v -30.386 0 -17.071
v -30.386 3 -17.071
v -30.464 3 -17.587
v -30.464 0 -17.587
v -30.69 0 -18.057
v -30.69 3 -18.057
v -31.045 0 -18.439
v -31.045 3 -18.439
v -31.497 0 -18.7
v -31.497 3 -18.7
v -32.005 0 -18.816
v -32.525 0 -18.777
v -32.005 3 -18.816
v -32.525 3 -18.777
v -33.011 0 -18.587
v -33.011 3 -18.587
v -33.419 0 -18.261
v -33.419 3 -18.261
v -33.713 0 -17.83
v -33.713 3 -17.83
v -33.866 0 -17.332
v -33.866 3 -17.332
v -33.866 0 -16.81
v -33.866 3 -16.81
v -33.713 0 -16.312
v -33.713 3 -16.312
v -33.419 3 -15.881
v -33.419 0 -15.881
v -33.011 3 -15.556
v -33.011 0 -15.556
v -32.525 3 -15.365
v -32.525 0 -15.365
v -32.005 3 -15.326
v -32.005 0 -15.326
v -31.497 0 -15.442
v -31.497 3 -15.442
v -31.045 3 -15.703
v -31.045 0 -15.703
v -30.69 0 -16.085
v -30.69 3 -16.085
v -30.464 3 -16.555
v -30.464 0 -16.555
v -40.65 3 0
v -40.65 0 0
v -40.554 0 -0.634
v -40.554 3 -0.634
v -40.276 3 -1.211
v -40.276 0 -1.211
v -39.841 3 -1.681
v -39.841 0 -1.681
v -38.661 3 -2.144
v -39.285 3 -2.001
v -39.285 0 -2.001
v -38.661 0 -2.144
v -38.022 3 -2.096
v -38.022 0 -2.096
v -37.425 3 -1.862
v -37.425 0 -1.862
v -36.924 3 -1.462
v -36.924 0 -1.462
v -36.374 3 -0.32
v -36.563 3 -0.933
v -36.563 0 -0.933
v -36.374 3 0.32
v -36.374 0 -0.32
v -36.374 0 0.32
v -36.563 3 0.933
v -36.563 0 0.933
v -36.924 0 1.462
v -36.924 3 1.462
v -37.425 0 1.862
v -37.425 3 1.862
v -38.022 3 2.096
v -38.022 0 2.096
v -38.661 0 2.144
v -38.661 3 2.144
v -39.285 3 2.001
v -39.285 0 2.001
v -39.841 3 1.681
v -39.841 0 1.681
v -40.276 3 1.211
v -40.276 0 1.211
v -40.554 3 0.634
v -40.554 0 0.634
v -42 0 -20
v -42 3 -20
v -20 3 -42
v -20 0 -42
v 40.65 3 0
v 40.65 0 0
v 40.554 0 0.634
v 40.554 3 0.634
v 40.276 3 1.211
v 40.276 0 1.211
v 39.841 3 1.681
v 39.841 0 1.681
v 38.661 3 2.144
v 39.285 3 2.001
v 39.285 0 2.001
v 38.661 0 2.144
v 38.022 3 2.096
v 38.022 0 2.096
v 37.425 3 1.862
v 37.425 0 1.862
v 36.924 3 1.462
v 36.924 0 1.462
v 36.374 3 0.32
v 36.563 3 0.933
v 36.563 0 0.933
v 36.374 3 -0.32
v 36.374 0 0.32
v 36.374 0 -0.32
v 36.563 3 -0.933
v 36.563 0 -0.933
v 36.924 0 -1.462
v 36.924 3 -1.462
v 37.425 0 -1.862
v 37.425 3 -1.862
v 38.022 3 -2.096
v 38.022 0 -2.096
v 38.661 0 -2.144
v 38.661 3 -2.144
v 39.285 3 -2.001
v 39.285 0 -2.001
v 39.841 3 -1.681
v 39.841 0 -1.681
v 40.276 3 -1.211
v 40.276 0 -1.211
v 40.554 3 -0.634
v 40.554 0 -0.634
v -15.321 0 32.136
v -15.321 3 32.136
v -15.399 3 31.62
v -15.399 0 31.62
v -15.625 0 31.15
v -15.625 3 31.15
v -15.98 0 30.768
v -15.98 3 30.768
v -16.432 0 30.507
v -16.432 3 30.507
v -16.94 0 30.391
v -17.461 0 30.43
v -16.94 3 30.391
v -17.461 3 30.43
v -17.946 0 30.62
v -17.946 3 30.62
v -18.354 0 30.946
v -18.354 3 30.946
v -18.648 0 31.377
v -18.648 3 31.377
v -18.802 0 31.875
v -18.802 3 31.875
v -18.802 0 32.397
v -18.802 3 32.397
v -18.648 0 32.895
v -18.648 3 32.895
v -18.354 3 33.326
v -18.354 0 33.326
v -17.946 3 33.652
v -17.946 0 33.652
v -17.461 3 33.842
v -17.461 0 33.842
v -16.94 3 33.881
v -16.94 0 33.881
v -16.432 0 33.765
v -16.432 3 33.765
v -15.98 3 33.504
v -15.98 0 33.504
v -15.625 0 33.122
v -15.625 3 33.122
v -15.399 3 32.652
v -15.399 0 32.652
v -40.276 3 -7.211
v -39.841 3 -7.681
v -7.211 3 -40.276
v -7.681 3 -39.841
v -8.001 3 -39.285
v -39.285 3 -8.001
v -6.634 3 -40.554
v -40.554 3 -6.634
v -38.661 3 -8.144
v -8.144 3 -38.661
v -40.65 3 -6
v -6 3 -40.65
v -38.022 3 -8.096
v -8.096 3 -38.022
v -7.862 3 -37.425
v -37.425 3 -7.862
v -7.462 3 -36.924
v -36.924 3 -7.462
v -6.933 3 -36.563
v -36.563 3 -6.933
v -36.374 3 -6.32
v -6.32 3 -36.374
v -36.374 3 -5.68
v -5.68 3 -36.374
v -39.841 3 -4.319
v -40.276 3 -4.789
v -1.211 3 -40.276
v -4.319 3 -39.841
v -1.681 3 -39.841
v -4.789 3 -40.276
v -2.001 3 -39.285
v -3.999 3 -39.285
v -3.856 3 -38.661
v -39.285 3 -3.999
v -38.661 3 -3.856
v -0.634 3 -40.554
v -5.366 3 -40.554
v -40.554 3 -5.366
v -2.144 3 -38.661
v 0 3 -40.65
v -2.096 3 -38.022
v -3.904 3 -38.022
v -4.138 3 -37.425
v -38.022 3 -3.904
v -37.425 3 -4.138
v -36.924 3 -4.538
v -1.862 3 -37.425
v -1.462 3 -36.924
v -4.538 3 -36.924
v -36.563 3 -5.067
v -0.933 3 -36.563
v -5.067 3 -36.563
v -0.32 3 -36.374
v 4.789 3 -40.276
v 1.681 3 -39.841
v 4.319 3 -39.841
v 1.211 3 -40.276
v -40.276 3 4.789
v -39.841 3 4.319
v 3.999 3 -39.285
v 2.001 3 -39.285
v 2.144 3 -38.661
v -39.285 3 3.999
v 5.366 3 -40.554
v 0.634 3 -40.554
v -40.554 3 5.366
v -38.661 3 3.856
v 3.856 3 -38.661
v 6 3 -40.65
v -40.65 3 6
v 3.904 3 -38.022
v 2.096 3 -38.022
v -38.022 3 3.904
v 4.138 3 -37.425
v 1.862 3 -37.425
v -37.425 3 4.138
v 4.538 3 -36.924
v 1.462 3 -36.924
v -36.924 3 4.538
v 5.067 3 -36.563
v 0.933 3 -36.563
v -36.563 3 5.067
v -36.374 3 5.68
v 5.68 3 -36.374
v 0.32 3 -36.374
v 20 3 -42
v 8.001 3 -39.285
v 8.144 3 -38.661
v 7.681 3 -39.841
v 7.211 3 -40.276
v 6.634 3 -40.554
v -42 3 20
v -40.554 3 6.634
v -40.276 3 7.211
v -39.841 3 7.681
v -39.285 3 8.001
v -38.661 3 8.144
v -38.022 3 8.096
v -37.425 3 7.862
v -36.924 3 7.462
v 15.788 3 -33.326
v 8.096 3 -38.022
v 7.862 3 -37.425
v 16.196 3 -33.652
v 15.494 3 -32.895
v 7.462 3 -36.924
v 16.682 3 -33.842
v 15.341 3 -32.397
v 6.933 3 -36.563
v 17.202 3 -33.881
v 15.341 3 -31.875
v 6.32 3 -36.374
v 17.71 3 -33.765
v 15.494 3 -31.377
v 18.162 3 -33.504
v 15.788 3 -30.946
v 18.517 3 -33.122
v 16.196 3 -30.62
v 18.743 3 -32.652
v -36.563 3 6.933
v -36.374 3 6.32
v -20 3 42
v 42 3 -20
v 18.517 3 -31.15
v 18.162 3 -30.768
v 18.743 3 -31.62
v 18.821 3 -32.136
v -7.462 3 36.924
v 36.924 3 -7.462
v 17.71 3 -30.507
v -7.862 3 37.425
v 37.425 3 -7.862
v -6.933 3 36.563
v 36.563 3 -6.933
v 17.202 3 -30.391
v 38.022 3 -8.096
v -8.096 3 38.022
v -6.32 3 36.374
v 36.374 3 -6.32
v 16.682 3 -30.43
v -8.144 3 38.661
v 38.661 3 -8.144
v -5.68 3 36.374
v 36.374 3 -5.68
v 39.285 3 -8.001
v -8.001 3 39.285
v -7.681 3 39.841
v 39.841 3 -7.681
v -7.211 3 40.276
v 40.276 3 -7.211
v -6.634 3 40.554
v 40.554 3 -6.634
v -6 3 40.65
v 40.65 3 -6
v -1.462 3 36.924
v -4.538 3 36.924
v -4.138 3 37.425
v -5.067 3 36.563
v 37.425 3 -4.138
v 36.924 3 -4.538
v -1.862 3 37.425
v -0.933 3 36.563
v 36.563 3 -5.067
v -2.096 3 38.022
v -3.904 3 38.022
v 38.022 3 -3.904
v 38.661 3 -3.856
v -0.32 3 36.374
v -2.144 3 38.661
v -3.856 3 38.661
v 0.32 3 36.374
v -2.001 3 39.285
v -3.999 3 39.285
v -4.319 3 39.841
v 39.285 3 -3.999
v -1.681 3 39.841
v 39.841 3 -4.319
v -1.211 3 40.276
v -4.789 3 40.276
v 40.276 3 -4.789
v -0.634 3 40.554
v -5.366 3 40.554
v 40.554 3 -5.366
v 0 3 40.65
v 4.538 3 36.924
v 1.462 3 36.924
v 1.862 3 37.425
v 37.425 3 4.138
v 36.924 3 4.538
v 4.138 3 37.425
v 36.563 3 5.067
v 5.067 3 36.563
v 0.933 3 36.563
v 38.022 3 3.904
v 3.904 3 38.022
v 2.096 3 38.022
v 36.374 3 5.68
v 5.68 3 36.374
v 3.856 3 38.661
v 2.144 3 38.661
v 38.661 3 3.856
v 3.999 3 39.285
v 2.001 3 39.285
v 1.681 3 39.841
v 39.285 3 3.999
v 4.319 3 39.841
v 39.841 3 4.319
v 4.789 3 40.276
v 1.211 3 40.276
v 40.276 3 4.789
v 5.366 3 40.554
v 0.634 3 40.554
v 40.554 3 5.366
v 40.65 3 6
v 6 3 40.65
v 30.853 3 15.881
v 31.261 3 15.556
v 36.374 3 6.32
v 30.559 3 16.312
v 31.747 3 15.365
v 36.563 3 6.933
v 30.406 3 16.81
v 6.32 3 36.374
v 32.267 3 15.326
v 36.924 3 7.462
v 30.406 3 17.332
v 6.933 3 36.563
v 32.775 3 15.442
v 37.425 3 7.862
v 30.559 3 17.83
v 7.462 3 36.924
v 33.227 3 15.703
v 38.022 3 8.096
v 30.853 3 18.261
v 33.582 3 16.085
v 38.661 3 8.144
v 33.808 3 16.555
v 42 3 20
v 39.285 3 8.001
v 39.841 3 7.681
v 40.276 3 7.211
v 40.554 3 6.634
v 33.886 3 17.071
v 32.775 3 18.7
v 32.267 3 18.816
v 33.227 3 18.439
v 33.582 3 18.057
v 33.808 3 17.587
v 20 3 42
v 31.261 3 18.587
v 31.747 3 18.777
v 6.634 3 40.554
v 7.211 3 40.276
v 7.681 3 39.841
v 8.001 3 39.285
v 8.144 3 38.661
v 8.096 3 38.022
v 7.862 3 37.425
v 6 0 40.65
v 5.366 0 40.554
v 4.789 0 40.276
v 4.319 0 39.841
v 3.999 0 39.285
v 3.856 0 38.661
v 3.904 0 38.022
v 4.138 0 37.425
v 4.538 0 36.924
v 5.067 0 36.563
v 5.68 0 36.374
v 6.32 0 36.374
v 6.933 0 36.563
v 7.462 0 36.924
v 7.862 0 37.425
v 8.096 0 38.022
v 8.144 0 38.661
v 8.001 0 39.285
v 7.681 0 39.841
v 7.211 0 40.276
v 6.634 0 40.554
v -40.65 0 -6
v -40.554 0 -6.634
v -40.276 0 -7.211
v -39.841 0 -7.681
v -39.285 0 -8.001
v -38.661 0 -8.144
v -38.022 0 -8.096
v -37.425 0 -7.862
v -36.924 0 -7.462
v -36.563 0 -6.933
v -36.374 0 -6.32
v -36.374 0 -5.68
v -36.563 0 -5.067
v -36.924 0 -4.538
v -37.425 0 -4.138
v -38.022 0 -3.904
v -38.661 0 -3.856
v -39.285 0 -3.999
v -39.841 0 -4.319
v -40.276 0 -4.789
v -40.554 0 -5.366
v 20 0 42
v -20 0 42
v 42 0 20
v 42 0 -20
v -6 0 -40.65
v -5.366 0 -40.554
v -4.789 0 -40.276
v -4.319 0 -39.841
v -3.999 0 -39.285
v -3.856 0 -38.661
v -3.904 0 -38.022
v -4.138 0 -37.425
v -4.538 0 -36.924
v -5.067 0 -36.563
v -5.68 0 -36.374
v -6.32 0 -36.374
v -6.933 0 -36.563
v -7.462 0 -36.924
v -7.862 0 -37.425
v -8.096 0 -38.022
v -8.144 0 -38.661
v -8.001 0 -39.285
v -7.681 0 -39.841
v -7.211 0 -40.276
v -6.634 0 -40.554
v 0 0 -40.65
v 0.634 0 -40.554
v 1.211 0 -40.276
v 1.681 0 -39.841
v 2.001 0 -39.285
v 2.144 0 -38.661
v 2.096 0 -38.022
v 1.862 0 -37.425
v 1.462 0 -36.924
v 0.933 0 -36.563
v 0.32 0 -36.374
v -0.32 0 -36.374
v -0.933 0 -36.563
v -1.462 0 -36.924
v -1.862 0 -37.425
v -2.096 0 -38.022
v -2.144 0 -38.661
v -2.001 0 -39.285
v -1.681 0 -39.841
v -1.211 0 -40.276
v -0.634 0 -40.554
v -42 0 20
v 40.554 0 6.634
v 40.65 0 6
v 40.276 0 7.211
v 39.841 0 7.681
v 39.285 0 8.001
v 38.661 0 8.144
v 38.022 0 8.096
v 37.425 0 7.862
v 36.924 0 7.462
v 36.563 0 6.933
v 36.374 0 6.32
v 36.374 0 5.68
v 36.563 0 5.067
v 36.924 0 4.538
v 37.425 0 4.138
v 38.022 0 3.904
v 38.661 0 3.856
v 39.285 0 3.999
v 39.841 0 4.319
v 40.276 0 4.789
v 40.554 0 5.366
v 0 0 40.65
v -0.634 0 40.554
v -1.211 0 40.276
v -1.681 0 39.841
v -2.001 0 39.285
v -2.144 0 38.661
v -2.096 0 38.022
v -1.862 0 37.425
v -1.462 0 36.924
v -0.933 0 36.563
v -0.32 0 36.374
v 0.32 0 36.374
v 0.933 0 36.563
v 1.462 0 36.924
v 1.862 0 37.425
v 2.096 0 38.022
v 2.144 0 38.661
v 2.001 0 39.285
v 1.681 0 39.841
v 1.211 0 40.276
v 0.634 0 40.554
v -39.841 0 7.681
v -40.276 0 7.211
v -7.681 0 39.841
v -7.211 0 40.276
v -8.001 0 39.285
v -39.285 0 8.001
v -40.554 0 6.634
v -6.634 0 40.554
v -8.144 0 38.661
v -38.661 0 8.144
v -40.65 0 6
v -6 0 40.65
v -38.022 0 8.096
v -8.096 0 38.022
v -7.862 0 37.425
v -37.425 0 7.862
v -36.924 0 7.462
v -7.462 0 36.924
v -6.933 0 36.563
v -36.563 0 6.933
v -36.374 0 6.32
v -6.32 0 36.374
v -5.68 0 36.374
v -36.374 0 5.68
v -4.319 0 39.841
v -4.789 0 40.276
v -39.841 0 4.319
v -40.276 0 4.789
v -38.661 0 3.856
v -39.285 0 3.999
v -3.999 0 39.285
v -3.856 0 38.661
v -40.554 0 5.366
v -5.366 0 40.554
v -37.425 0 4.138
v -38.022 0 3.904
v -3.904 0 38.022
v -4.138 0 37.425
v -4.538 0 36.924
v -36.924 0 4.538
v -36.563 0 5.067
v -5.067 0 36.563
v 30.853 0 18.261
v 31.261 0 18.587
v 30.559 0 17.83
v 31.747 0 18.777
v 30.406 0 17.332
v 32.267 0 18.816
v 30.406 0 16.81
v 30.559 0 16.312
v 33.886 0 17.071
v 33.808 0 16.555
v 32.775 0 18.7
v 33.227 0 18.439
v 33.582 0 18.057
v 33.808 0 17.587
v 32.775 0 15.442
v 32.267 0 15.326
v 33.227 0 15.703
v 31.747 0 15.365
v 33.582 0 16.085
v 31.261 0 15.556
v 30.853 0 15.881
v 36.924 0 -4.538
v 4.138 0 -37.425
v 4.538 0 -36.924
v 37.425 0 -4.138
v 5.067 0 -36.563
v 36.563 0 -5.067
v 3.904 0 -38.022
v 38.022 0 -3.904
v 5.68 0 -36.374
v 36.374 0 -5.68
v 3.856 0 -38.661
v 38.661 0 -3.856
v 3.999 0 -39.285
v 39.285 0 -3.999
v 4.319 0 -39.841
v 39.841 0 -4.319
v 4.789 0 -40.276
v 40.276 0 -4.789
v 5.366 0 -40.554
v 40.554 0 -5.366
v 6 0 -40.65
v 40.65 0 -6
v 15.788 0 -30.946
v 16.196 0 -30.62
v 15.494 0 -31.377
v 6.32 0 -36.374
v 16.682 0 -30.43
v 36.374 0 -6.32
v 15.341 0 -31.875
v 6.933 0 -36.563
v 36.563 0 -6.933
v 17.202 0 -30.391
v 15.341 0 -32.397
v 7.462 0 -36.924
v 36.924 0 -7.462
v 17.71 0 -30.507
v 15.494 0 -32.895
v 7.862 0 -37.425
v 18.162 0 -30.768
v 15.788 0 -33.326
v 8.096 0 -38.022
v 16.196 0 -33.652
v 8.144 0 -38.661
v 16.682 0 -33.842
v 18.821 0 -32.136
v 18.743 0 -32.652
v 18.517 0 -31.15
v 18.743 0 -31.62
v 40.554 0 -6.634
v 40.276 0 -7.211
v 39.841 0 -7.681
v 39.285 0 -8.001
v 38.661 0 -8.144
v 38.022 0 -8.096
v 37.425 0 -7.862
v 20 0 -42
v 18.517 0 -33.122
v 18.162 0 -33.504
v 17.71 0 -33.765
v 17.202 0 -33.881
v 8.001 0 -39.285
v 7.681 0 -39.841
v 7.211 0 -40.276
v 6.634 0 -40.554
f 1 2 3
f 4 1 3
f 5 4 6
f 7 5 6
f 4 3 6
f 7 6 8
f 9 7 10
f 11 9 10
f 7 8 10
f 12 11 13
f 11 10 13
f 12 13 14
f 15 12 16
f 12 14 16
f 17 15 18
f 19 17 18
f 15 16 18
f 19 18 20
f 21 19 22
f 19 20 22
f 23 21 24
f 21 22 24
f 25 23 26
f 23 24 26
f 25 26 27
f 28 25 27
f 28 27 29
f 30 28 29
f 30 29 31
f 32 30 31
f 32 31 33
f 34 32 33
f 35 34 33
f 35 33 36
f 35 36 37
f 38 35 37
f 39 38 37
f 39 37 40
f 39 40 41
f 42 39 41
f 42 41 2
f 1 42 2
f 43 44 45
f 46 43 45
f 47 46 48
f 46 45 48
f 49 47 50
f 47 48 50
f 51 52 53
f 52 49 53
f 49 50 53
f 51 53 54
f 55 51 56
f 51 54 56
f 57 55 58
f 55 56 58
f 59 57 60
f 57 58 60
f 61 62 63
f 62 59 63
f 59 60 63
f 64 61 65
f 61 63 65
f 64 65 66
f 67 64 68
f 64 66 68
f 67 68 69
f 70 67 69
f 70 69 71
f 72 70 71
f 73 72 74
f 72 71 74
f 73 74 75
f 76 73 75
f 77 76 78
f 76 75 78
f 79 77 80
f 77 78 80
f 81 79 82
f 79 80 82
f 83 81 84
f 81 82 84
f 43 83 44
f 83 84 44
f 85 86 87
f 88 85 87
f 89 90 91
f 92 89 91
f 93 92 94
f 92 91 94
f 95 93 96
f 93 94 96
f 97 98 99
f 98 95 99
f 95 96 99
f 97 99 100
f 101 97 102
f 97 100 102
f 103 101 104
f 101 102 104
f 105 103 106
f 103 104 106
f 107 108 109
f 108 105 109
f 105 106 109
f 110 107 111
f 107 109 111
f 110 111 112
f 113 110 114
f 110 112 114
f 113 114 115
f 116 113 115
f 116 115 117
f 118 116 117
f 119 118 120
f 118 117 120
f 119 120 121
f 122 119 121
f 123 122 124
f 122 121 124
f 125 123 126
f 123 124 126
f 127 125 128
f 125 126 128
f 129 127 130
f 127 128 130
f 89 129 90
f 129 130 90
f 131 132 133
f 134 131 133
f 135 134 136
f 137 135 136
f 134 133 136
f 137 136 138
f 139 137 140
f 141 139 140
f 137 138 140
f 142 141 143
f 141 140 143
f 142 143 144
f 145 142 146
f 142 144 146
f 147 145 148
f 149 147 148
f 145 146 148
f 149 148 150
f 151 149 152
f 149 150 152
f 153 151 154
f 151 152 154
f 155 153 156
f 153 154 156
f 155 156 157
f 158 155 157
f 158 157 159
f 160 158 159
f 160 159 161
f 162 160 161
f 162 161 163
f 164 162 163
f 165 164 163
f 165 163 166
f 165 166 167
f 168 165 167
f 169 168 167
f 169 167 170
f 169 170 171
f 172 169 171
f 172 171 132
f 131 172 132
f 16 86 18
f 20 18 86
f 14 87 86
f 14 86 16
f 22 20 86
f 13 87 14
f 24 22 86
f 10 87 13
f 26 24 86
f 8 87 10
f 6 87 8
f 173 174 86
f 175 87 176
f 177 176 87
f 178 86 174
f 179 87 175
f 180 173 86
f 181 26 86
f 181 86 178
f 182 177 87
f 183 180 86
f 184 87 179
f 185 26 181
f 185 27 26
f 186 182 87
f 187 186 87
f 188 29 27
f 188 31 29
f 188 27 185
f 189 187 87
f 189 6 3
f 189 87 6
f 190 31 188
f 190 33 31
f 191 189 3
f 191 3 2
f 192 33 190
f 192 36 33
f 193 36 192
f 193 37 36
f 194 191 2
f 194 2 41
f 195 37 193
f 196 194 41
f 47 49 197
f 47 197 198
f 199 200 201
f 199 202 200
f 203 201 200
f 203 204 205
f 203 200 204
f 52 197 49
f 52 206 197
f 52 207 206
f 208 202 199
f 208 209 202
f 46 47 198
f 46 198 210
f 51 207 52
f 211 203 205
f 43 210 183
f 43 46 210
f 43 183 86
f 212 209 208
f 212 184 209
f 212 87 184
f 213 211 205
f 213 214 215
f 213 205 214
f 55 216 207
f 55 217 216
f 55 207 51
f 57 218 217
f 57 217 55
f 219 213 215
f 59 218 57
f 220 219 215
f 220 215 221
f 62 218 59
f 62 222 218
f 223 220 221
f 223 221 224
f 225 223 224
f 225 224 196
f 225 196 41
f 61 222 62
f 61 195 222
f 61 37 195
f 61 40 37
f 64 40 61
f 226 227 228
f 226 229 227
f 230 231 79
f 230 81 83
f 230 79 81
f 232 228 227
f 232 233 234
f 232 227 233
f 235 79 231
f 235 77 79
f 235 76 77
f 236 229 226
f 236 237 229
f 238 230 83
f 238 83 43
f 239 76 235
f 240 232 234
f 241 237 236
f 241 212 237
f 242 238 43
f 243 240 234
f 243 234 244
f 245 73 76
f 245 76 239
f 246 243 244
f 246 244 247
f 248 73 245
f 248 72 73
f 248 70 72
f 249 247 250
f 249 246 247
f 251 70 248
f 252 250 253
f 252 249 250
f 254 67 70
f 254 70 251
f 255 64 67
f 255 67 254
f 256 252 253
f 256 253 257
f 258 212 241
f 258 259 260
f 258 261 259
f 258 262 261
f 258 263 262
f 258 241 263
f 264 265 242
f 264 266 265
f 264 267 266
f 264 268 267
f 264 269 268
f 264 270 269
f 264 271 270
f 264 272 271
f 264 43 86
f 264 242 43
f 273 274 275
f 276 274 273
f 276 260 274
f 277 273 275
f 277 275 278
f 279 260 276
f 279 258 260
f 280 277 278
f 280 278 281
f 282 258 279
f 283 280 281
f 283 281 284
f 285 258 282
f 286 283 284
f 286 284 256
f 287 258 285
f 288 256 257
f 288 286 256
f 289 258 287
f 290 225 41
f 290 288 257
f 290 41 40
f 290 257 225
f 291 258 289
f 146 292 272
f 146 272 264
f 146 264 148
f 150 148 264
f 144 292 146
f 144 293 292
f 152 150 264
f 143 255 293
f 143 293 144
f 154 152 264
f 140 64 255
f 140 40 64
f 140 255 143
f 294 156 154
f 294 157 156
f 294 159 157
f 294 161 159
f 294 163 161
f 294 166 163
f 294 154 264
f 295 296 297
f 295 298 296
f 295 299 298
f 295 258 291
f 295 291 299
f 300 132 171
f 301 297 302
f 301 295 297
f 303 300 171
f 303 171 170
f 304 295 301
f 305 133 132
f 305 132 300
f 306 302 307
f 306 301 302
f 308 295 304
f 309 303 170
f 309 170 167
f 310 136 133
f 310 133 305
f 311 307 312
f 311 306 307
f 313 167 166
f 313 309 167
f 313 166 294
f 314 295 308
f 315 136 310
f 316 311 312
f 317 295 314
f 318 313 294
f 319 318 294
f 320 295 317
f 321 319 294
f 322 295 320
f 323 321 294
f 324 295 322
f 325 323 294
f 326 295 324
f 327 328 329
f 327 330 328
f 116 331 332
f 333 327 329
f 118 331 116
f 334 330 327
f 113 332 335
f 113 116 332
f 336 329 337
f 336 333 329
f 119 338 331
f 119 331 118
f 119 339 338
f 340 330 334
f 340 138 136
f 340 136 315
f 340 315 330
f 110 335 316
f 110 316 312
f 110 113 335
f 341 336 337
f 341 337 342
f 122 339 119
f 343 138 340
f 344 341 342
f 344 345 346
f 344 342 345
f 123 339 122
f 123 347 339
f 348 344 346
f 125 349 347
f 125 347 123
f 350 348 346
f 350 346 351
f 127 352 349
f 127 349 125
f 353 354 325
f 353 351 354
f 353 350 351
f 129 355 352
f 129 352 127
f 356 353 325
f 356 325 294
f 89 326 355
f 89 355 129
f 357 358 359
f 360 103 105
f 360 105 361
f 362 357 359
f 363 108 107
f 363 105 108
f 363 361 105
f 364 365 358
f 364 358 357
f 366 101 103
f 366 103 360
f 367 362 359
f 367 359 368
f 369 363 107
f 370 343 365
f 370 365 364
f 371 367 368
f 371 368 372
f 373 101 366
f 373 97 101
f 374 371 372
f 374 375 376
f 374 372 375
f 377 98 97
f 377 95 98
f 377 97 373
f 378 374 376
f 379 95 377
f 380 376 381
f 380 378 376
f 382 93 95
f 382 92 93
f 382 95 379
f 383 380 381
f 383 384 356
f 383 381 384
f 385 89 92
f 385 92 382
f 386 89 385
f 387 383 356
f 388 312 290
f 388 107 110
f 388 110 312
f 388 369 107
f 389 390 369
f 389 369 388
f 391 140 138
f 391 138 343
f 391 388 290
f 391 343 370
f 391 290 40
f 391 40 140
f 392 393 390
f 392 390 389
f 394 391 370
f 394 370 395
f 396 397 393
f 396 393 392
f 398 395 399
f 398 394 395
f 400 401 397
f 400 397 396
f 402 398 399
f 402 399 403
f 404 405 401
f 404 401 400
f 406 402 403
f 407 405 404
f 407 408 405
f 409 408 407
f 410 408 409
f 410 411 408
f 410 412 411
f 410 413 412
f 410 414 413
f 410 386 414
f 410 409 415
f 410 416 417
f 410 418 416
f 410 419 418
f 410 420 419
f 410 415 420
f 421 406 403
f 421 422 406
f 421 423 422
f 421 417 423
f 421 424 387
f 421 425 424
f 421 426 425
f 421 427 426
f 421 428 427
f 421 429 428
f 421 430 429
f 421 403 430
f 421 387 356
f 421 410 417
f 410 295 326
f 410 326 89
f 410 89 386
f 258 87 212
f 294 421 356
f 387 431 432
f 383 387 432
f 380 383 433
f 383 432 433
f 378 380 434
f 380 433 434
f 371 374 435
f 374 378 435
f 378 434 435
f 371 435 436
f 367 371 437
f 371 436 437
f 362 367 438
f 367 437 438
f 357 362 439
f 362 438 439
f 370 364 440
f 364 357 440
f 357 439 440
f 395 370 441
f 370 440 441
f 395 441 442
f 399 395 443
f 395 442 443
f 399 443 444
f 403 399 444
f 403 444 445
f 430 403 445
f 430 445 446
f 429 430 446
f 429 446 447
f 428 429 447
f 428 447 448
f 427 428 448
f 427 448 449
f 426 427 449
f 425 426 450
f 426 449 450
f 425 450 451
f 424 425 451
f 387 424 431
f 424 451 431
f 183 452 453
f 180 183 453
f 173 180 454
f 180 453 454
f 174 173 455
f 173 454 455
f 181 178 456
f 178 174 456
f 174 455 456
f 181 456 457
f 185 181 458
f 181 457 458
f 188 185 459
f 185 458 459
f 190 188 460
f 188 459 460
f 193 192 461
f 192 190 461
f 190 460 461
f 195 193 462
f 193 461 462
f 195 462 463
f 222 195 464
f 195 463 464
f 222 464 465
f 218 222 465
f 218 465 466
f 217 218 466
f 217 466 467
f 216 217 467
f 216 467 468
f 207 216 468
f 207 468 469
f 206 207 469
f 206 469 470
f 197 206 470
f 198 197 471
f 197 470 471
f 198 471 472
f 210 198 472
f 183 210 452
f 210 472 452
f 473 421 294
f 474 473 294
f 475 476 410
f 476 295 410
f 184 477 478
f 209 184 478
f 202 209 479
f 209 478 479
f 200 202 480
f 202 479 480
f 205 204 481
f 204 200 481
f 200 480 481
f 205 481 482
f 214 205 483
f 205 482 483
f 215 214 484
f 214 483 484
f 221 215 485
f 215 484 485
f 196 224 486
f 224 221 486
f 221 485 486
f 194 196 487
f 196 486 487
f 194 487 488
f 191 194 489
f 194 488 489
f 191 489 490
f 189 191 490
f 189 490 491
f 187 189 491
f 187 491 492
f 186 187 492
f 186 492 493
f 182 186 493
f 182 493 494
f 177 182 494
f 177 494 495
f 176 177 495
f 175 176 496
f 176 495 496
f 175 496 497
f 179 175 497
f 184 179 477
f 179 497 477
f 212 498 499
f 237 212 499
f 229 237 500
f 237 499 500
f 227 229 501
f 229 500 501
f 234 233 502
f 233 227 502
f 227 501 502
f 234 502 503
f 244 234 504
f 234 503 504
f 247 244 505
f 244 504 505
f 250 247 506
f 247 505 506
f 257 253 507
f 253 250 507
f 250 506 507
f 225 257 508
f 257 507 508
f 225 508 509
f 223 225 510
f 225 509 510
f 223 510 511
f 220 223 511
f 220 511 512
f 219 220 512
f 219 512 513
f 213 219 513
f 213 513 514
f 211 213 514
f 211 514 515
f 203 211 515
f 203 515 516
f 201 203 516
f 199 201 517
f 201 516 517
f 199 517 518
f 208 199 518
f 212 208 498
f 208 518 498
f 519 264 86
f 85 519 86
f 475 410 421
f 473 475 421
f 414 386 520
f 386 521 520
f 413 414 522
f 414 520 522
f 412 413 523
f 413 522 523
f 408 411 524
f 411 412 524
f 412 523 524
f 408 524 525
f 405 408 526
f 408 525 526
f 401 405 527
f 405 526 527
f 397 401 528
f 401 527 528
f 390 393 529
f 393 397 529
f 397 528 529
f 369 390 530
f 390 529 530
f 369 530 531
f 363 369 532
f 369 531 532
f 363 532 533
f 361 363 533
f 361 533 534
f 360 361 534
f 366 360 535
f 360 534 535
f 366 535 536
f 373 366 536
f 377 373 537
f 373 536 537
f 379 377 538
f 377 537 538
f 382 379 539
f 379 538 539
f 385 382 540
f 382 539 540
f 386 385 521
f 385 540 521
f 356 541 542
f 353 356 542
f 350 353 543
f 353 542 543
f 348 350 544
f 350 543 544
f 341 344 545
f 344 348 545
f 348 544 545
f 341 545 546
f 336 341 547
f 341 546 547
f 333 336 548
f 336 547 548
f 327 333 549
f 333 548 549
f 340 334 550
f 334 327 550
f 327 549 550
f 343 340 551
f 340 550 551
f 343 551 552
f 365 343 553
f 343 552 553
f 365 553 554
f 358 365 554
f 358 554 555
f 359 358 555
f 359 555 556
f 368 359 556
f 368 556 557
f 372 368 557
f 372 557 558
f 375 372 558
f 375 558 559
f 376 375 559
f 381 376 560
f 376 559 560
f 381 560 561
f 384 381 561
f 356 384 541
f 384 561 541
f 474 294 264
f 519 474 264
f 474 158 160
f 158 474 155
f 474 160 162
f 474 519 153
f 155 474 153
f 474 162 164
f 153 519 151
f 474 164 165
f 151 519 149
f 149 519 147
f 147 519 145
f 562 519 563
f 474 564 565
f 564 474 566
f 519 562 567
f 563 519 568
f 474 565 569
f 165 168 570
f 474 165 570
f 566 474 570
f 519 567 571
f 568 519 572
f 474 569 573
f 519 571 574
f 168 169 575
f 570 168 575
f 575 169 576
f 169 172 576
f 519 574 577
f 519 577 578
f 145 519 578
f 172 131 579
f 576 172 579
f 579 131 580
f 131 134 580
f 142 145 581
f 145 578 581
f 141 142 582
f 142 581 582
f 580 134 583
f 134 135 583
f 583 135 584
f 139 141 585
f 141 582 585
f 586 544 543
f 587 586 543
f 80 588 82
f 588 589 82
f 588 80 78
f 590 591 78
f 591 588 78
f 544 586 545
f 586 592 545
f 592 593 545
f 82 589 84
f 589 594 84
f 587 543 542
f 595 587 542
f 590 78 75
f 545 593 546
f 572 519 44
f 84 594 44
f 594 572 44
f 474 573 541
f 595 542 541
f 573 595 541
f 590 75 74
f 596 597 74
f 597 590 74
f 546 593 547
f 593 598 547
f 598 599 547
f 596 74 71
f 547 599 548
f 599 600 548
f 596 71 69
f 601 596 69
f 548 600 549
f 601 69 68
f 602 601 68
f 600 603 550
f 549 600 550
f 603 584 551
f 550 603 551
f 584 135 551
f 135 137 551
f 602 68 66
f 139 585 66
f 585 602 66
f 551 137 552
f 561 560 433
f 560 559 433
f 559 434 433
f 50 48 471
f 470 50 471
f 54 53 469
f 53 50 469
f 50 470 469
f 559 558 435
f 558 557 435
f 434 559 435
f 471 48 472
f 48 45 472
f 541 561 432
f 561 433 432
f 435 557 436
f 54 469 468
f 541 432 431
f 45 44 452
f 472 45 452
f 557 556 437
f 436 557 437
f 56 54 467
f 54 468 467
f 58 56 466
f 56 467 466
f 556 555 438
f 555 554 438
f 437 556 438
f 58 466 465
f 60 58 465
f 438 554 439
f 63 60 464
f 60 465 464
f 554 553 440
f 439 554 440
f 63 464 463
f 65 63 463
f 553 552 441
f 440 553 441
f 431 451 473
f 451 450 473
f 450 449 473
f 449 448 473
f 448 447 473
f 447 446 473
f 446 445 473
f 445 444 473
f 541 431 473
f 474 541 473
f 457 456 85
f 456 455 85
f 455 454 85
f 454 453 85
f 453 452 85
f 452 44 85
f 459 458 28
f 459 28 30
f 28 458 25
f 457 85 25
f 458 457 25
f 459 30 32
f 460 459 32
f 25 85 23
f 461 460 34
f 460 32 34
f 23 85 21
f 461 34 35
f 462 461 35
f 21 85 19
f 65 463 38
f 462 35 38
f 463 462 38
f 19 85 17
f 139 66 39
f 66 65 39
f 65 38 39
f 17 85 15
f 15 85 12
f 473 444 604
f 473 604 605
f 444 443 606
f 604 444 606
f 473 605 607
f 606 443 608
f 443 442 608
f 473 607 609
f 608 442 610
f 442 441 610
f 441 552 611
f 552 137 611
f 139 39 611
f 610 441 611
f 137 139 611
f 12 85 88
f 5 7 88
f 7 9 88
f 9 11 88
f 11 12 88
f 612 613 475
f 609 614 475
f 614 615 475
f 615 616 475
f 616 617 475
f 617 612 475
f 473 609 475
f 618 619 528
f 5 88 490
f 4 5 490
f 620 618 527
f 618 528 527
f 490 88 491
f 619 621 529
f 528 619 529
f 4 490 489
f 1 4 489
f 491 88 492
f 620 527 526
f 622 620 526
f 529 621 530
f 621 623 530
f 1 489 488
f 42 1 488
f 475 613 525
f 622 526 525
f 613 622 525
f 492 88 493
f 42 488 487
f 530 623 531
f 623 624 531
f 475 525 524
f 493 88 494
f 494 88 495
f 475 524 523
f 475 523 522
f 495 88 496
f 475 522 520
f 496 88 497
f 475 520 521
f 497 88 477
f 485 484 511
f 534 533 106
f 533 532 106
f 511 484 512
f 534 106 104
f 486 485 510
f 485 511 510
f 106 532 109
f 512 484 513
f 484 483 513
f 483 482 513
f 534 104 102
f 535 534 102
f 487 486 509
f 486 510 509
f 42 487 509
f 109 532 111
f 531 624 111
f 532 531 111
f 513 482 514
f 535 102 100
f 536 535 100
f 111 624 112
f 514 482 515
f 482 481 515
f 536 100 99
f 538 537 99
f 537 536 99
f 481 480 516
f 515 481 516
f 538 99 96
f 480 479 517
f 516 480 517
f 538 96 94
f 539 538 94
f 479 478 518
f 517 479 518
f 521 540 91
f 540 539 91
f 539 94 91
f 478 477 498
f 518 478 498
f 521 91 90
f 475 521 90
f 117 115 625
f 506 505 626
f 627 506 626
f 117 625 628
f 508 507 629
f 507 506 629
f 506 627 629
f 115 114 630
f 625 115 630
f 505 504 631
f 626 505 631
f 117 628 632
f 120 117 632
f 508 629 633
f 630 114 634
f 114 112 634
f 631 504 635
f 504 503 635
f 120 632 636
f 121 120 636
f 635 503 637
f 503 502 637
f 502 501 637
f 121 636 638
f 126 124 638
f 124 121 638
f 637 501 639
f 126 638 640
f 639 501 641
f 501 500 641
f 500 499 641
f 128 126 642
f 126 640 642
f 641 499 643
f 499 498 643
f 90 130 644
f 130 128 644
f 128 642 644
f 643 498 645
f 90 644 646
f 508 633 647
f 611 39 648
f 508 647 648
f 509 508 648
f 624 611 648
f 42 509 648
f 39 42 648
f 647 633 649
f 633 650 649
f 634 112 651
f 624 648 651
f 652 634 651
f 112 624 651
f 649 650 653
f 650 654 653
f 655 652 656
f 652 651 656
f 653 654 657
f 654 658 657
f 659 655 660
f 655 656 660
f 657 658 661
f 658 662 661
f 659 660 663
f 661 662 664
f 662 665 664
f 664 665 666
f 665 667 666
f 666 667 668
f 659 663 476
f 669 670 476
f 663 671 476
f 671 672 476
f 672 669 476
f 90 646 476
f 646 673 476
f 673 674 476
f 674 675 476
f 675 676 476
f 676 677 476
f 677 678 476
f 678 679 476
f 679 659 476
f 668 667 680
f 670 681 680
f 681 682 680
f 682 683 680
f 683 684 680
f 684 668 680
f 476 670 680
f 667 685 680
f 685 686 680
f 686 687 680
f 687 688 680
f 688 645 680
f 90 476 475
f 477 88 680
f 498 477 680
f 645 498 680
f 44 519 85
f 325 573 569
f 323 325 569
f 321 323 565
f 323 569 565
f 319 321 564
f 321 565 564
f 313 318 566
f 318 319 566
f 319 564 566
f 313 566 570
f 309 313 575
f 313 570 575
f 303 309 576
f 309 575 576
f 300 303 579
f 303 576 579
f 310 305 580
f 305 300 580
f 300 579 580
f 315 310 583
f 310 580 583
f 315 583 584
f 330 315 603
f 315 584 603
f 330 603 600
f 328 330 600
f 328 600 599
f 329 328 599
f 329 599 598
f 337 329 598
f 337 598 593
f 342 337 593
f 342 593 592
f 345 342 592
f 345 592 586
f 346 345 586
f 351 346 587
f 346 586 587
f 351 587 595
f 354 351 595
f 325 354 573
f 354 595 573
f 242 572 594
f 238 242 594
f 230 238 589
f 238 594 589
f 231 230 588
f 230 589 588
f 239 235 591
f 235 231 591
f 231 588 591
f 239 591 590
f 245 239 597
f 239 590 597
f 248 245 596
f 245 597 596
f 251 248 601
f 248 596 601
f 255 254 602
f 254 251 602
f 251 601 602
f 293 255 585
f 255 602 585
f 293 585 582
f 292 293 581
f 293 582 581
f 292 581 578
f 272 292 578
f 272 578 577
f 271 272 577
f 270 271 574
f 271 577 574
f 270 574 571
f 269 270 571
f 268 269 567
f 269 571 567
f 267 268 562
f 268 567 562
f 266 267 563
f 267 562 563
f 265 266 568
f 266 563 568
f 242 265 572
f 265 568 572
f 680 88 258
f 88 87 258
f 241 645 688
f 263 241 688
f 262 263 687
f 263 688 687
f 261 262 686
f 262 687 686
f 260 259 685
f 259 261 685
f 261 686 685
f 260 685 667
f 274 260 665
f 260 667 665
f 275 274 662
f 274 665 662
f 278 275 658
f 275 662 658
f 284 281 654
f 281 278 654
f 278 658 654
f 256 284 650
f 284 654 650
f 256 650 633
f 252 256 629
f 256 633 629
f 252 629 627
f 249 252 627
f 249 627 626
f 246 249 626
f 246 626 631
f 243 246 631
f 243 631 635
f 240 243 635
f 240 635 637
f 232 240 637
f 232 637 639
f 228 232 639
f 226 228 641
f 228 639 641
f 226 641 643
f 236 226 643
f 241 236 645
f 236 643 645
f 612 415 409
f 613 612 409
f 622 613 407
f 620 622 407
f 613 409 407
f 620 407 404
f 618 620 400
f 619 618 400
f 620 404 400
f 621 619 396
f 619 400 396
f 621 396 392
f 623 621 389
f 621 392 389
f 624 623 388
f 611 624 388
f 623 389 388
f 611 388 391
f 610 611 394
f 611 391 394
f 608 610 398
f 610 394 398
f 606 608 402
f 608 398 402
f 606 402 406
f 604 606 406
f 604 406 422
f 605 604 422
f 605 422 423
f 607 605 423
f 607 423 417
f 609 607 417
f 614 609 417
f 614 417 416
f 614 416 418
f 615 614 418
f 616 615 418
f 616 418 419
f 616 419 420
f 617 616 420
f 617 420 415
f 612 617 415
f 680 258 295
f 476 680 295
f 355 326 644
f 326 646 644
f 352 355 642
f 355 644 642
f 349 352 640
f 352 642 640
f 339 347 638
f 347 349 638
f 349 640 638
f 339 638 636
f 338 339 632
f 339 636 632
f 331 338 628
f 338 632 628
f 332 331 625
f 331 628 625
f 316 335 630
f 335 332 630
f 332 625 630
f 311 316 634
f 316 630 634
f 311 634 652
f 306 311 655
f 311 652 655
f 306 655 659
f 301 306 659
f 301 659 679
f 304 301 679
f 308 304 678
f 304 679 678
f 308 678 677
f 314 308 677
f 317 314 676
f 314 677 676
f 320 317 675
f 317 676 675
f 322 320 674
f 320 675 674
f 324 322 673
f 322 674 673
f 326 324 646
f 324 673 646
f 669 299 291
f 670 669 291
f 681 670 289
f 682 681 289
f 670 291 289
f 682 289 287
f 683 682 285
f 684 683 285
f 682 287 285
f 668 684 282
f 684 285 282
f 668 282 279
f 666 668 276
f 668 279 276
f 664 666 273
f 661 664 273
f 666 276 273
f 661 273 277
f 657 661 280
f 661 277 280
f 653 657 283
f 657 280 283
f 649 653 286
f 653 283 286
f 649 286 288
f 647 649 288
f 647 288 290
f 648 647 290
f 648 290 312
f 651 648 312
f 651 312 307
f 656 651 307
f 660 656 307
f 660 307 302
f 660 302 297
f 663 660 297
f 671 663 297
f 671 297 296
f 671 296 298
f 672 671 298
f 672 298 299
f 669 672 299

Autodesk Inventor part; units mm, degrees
ref_plane "YZ Plane" through (0, 0, 0) normal (1, 0, 0) x (0, 1, 0)
ref_plane "XZ Plane" through (0, 0, 0) normal (0, 1, 0) x (-1, 0, 0)
ref_plane "XY Plane" through (0, 0, 0) normal (0, 0, 1) x (1, 0, 0)
sketch "Esquisse1" plane through (0, 0, 0) normal (0, 1, 0) x (-1, 0, 0)
  line L0 (35, 35) -> (35, 14)
  line L1 (35, 14) -> (42, 10)
  line L2 (42, 10) -> (42, 0)
  line L3 (35, 35) -> (0, 0)
  line L4 (42, 0) -> (0, 0) construction
  line L5 (35, -35) -> (35, -14)
  line L6 (35, -14) -> (42, -10)
  line L7 (42, -10) -> (42, 0)
  line L8 (35, -35) -> (0, 0)
  line L9 (38.5, -12) -> (38.5, 12) construction
  circle A0 centre (38.5, 0) radius 2.15
  circle A1 centre (38.5, 6) radius 2.15
  circle A2 centre (38.5, -6) radius 2.15
  dimension "d0" = 90
  dimension "d1" = 70
  dimension "d4" = 6
  dimension "d11" = 6
  dimension "d16" = 4.3
  dimension "d17" = 20
  dimension "d18" = 4
  dimension "d19" = 7
extrude "Extrusion1" add sketch "Esquisse1" along normal blind 3
pattern_circular "Réseau circulaire1" count 4 over 360 about axis through (0, 0, 0) along (0, 1, 0) of "Extrusion1"
chamfer "Chanfrein1" distance 8 angle 45 4 edges at (35, 1.5, -35) (-35, 1.5, -35) (-35, 1.5, 35) (35, 1.5, 35)
ref_plane "Plan de construction3" through (-4, 0, 4) normal (0.7071, 0, 0.7071) x (0.7071, 0, -0.7071)
ref_plane "Plan de construction4" through (-4, 0, -4) normal (-0.7071, 0, 0.7071) x (0.7071, 0, 0.7071)
sketch "Esquisse15" plane through (0, 3, 0) normal (0, 1, 0) x (1, 0, 0)
  line L0 (35, -27) -> (27, -35) construction
  line L1 (35, -27) -> (35, -14) construction
  line L2 (35, -14) -> (42, -10) construction
  line L3 (42, -10) -> (42, 10) construction
  line L4 (42, 10) -> (35, 14) construction
  line L5 (35, 14) -> (35, 27) construction
  line L6 (27, 35) -> (35, 27) construction
  line L7 (27, 35) -> (14, 35) construction
  line L8 (14, 35) -> (10, 42) construction
  line L9 (10, 42) -> (-10, 42) construction
  line L10 (-10, 42) -> (-14, 35) construction
  line L11 (-14, 35) -> (-27, 35) construction
  line L12 (-35, 27) -> (-27, 35) construction
  line L13 (-35, 27) -> (-35, 14) construction
  line L14 (-35, 14) -> (-42, 10) construction
  line L15 (-42, 10) -> (-42, -10) construction
  line L16 (-42, -10) -> (-35, -14) construction
  line L17 (-35, -14) -> (-35, -27) construction
  line L18 (-27, -35) -> (-35, -27) construction
  line L19 (-27, -35) -> (-14, -35) construction
  line L20 (-14, -35) -> (-10, -42) construction
  line L21 (-10, -42) -> (10, -42) construction
  line L22 (10, -42) -> (14, -35) construction
  line L23 (14, -35) -> (27, -35) construction
  circle A0 centre (0, -38.5) radius 2.15 construction
  circle A1 centre (6, -38.5) radius 2.15 construction
  circle A2 centre (-6, -38.5) radius 2.15 construction
  circle A3 centre (38.5, -6) radius 2.15 construction
  circle A4 centre (38.5, 6) radius 2.15 construction
  circle A5 centre (38.5, 0) radius 2.15 construction
  circle A6 centre (6, 38.5) radius 2.15 construction
  circle A7 centre (-6, 38.5) radius 2.15 construction
  circle A8 centre (0, 38.5) radius 2.15 construction
  circle A9 centre (-38.5, 6) radius 2.15 construction
  circle A10 centre (-38.5, -6) radius 2.15 construction
  circle A11 centre (-38.5, 0) radius 2.15 construction
  line L24 (10, 42) -> (20, 42)
  line L25 (20, 42) -> (42, 20)
  line L26 (42, -10) -> (42, 10) projected
  line L27 (42, 20) -> (42, 10)
  line L28 (27, 35) -> (35, 27) projected
  line L29 (0, 0) -> (42, 10)
  line L30 (10, 42) -> (0, 0)
  line L31 (10, 42) -> (-10, 42) projected
extrude "Extrusion13" add sketch "Esquisse15" against normal blind 3
pattern_circular "Réseau circulaire7" count 4 over 360 about axis through (0, 0, 0) along (0, 1, 0) of "Extrusion13"
sketch "Esquisse9" plane through (0, 0, 0) normal (0, -1, 0) x (1, 0, 0)
  line L0 (0, 0) -> (21.8388, 21.8388) construction
  line L1 (0, 0) -> (66.7346, 0) construction
  line L2 (0, 0) -> (0, 22.6965) construction
  line L3 (31.4289, 0) -> (31.4289, 10)
  line L4 (31.4289, 10) -> (38.5, 17.0711)
  line L5 (38.5, 17.0711) -> (27.7855, 27.7855)
  line L6 (0, 31.4289) -> (10, 31.4289)
  line L7 (10, 31.4289) -> (17.0711, 38.5)
  line L8 (17.0711, 38.5) -> (27.7855, 27.7855)
  line L9 (38.5, -17.0711) -> (27.7855, -27.7855)
  line L10 (31.4289, -10) -> (38.5, -17.0711)
  line L11 (31.4289, 0) -> (31.4289, -10)
  line L12 (17.0711, -38.5) -> (27.7855, -27.7855)
  line L13 (10, -31.4289) -> (17.0711, -38.5)
  line L14 (0, -31.4289) -> (10, -31.4289)
  line L15 (-31.4289, 0) -> (-31.4289, -10)
  line L16 (-31.4289, -10) -> (-38.5, -17.0711)
  line L17 (-38.5, -17.0711) -> (-27.7855, -27.7855)
  line L18 (-17.0711, -38.5) -> (-27.7855, -27.7855)
  line L19 (0, -31.4289) -> (-10, -31.4289)
  line L20 (-10, -31.4289) -> (-17.0711, -38.5)
  line L21 (0, 0) -> (-66.7346, 0) construction
  line L22 (-31.4289, 0) -> (-31.4289, 10)
  line L23 (-31.4289, 10) -> (-38.5, 17.0711)
  line L24 (0, 31.4289) -> (-10, 31.4289)
  line L25 (0, 0) -> (-21.8388, 21.8388) construction
  line L26 (-10, 31.4289) -> (-17.0711, 38.5)
  line L27 (-17.0711, 38.5) -> (-27.7855, 27.7855)
  line L28 (-38.5, 17.0711) -> (-27.7855, 27.7855)
  line L29 (27.432, 27.432) -> (37.7929, 17.0711)
  line L30 (37.7929, 17.0711) -> (30.9289, 10.2071)
  line L31 (30.9289, 10.2071) -> (30.9289, 0)
  line L32 (30.9289, 0) -> (30.9289, -10.2071)
  line L33 (30.9289, -10.2071) -> (37.7929, -17.0711)
  line L34 (37.7929, -17.0711) -> (27.432, -27.432)
  line L35 (27.432, -27.432) -> (17.0711, -37.7929)
  line L36 (17.0711, -37.7929) -> (10.2071, -30.9289)
  line L37 (10.2071, -30.9289) -> (0, -30.9289)
  line L38 (0, -30.9289) -> (-10.2071, -30.9289)
  line L39 (-10.2071, -30.9289) -> (-17.0711, -37.7929)
  line L40 (-17.0711, -37.7929) -> (-27.432, -27.432)
  line L41 (-27.432, -27.432) -> (-37.7929, -17.0711)
  line L42 (-37.7929, -17.0711) -> (-30.9289, -10.2071)
  line L43 (-30.9289, -10.2071) -> (-30.9289, 0)
  line L44 (-30.9289, 0) -> (-30.9289, 10.2071)
  line L45 (-30.9289, 10.2071) -> (-37.7929, 17.0711)
  line L46 (-37.7929, 17.0711) -> (-27.432, 27.432)
  line L47 (-27.432, 27.432) -> (-17.0711, 37.7929)
  line L48 (-17.0711, 37.7929) -> (-10.2071, 30.9289)
  line L49 (-10.2071, 30.9289) -> (0, 30.9289)
  line L50 (0, 30.9289) -> (10.2071, 30.9289)
  line L51 (10.2071, 30.9289) -> (17.0711, 37.7929)
  line L52 (17.0711, 37.7929) -> (27.432, 27.432)
  dimension "d67" = 45
  dimension "d68" = 10
  dimension "d69" = 10
  dimension "d70" = 38.5
  dimension "d71" = 77
  dimension "d86" = 0.5
extrude "Extrusion9" cut sketch "Esquisse9" against normal through all contours L29 L30 L31 L32 L33 L34 L35 L36 L37 L38 L39 L40 L41 L42 L43 L44 L45 L46 L47 L48 L49 L50 L51 L52
sketch "Esquisse12" plane through (0, 3, 0) normal (0, 1, 0) x (1, 0, 0)
  line L0 (-10, -31.4289) -> (-17.0711, -38.5) projected
  line L1 (-17.0711, -38.5) -> (-27.7855, -27.7855) projected
  line L2 (-31.4289, -10) -> (-38.5, -17.0711) projected
  line L3 (-38.5, -17.0711) -> (-27.7855, -27.7855) projected
  line L4 (-10, -31.4289) -> (-15.6569, -25.7721)
  line L5 (-15.6569, -25.7721) -> (-22.7279, -32.8431)
  circle A0 centre (-17.0711, -32.136) radius 1.75
  line L6 (-10, -31.4289) -> (-17.0711, -38.5)
  line L7 (-17.0711, -38.5) -> (-22.7279, -32.8431)
  line L8 (31.4289, -10) -> (25.7721, -15.6569)
  line L9 (25.7721, -15.6569) -> (32.8431, -22.7279)
  circle A1 centre (32.136, -17.0711) radius 1.75
  line L10 (31.4289, -10) -> (38.5, -17.0711)
  line L11 (38.5, -17.0711) -> (32.8431, -22.7279)
  line L12 (10, 31.4289) -> (15.6569, 25.7721)
  line L13 (15.6569, 25.7721) -> (22.7279, 32.8431)
  circle A2 centre (17.0711, 32.136) radius 1.75
  line L14 (10, 31.4289) -> (17.0711, 38.5)
  line L15 (17.0711, 38.5) -> (22.7279, 32.8431)
  line L16 (-31.4289, 10) -> (-25.7721, 15.6569)
  line L17 (-25.7721, 15.6569) -> (-32.8431, 22.7279)
  circle A3 centre (-32.136, 17.0711) radius 1.75
  line L18 (-31.4289, 10) -> (-38.5, 17.0711)
  line L19 (-38.5, 17.0711) -> (-32.8431, 22.7279)
  point P0 (0, 0)
  dimension "d32" = 8
  dimension "d89" = 4.5
  dimension "d90" = 4.5
  dimension "d91" = 3.5
  dimension "d94" = 360
  dimension "d98" = 8
extrude "Extrusion10" add sketch "Esquisse12" against normal blind 3
sketch "Esquisse14" plane through (0, 3, 0) normal (0, 1, 0) x (1, 0, 0)
  line L0 (20, 42) -> (42, 20) projected
  line L1 (-42, 20) -> (-20, 42) projected
  line L2 (-20, -42) -> (-42, -20) projected
  line L3 (42, -20) -> (20, -42) projected
  circle A0 centre (17.0711, 32.136) radius 1.75 projected
  circle A1 centre (-17.0711, -32.136) radius 1.75 projected
  circle A2 centre (32.136, -17.0711) radius 1.75 projected
  circle A3 centre (-32.136, 17.0711) radius 1.75 projected
  line L4 (22.3744, 32.4896) -> (37.7929, 17.0711) projected
  line L5 (37.7929, 17.0711) -> (30.9289, 10.2071) projected
  line L6 (30.9289, 10.2071) -> (30.9289, -10.2071) projected
  line L7 (30.9289, -10.2071) -> (31.0754, -10.3536) projected
  line L8 (25.7721, -15.6569) -> (31.0754, -10.3536) projected
  line L9 (32.4896, -22.3744) -> (25.7721, -15.6569) projected
  line L10 (32.4896, -22.3744) -> (17.0711, -37.7929) projected
  line L11 (17.0711, -37.7929) -> (10.2071, -30.9289) projected
  line L12 (10.2071, -30.9289) -> (-10.2071, -30.9289) projected
  line L13 (-10.2071, -30.9289) -> (-10.3536, -31.0754) projected
  line L14 (-10.3536, -31.0754) -> (-15.6569, -25.7721) projected
  line L15 (-15.6569, -25.7721) -> (-22.3744, -32.4896) projected
  line L16 (-22.3744, -32.4896) -> (-37.7929, -17.0711) projected
  line L17 (-37.7929, -17.0711) -> (-30.9289, -10.2071) projected
  line L18 (-30.9289, -10.2071) -> (-30.9289, 10.2071) projected
  line L19 (-30.9289, 10.2071) -> (-31.0754, 10.3536) projected
  line L20 (-25.7721, 15.6569) -> (-31.0754, 10.3536) projected
  line L21 (-32.4896, 22.3744) -> (-25.7721, 15.6569) projected
  line L22 (-32.4896, 22.3744) -> (-17.0711, 37.7929) projected
  line L23 (-17.0711, 37.7929) -> (-10.2071, 30.9289) projected
  line L24 (-10.2071, 30.9289) -> (10.2071, 30.9289) projected
  line L25 (10.2071, 30.9289) -> (10.3536, 31.0754) projected
  line L26 (15.6569, 25.7721) -> (10.3536, 31.0754) projected
  line L27 (22.3744, 32.4896) -> (15.6569, 25.7721) projected
  circle A4 centre (38.5, 0) radius 2.15 projected
  circle A5 centre (38.5, 6) radius 2.15 projected
  circle A6 centre (38.5, -6) radius 2.15 projected
  circle A7 centre (-6, -38.5) radius 2.15 projected
  circle A8 centre (6, -38.5) radius 2.15 projected
  circle A9 centre (0, -38.5) radius 2.15 projected
  circle A10 centre (-38.5, 0) radius 2.15 projected
  circle A11 centre (-38.5, -6) radius 2.15 projected
  circle A12 centre (-38.5, 6) radius 2.15 projected
  circle A13 centre (0, 38.5) radius 2.15 projected
  circle A14 centre (-6, 38.5) radius 2.15 projected
  circle A15 centre (6, 38.5) radius 2.15 projected
  line L28 (42, 20) -> (42, -20) projected
  line L29 (-20, 42) -> (20, 42) projected
  line L30 (-42, -20) -> (-42, 20) projected
  line L31 (20, -42) -> (-20, -42) projected
  point P0 (0, 0)
extrude "Extrusion12" add sketch "Esquisse14" against normal blind 3 contours L4 L5 L6 L7 L8 L9 L10 L11 L12 L13 L14 L15 L16 L17 L18 L19 L20 L21 L22 L23 L24 L25 L26 L27
properties part number "bottom"
